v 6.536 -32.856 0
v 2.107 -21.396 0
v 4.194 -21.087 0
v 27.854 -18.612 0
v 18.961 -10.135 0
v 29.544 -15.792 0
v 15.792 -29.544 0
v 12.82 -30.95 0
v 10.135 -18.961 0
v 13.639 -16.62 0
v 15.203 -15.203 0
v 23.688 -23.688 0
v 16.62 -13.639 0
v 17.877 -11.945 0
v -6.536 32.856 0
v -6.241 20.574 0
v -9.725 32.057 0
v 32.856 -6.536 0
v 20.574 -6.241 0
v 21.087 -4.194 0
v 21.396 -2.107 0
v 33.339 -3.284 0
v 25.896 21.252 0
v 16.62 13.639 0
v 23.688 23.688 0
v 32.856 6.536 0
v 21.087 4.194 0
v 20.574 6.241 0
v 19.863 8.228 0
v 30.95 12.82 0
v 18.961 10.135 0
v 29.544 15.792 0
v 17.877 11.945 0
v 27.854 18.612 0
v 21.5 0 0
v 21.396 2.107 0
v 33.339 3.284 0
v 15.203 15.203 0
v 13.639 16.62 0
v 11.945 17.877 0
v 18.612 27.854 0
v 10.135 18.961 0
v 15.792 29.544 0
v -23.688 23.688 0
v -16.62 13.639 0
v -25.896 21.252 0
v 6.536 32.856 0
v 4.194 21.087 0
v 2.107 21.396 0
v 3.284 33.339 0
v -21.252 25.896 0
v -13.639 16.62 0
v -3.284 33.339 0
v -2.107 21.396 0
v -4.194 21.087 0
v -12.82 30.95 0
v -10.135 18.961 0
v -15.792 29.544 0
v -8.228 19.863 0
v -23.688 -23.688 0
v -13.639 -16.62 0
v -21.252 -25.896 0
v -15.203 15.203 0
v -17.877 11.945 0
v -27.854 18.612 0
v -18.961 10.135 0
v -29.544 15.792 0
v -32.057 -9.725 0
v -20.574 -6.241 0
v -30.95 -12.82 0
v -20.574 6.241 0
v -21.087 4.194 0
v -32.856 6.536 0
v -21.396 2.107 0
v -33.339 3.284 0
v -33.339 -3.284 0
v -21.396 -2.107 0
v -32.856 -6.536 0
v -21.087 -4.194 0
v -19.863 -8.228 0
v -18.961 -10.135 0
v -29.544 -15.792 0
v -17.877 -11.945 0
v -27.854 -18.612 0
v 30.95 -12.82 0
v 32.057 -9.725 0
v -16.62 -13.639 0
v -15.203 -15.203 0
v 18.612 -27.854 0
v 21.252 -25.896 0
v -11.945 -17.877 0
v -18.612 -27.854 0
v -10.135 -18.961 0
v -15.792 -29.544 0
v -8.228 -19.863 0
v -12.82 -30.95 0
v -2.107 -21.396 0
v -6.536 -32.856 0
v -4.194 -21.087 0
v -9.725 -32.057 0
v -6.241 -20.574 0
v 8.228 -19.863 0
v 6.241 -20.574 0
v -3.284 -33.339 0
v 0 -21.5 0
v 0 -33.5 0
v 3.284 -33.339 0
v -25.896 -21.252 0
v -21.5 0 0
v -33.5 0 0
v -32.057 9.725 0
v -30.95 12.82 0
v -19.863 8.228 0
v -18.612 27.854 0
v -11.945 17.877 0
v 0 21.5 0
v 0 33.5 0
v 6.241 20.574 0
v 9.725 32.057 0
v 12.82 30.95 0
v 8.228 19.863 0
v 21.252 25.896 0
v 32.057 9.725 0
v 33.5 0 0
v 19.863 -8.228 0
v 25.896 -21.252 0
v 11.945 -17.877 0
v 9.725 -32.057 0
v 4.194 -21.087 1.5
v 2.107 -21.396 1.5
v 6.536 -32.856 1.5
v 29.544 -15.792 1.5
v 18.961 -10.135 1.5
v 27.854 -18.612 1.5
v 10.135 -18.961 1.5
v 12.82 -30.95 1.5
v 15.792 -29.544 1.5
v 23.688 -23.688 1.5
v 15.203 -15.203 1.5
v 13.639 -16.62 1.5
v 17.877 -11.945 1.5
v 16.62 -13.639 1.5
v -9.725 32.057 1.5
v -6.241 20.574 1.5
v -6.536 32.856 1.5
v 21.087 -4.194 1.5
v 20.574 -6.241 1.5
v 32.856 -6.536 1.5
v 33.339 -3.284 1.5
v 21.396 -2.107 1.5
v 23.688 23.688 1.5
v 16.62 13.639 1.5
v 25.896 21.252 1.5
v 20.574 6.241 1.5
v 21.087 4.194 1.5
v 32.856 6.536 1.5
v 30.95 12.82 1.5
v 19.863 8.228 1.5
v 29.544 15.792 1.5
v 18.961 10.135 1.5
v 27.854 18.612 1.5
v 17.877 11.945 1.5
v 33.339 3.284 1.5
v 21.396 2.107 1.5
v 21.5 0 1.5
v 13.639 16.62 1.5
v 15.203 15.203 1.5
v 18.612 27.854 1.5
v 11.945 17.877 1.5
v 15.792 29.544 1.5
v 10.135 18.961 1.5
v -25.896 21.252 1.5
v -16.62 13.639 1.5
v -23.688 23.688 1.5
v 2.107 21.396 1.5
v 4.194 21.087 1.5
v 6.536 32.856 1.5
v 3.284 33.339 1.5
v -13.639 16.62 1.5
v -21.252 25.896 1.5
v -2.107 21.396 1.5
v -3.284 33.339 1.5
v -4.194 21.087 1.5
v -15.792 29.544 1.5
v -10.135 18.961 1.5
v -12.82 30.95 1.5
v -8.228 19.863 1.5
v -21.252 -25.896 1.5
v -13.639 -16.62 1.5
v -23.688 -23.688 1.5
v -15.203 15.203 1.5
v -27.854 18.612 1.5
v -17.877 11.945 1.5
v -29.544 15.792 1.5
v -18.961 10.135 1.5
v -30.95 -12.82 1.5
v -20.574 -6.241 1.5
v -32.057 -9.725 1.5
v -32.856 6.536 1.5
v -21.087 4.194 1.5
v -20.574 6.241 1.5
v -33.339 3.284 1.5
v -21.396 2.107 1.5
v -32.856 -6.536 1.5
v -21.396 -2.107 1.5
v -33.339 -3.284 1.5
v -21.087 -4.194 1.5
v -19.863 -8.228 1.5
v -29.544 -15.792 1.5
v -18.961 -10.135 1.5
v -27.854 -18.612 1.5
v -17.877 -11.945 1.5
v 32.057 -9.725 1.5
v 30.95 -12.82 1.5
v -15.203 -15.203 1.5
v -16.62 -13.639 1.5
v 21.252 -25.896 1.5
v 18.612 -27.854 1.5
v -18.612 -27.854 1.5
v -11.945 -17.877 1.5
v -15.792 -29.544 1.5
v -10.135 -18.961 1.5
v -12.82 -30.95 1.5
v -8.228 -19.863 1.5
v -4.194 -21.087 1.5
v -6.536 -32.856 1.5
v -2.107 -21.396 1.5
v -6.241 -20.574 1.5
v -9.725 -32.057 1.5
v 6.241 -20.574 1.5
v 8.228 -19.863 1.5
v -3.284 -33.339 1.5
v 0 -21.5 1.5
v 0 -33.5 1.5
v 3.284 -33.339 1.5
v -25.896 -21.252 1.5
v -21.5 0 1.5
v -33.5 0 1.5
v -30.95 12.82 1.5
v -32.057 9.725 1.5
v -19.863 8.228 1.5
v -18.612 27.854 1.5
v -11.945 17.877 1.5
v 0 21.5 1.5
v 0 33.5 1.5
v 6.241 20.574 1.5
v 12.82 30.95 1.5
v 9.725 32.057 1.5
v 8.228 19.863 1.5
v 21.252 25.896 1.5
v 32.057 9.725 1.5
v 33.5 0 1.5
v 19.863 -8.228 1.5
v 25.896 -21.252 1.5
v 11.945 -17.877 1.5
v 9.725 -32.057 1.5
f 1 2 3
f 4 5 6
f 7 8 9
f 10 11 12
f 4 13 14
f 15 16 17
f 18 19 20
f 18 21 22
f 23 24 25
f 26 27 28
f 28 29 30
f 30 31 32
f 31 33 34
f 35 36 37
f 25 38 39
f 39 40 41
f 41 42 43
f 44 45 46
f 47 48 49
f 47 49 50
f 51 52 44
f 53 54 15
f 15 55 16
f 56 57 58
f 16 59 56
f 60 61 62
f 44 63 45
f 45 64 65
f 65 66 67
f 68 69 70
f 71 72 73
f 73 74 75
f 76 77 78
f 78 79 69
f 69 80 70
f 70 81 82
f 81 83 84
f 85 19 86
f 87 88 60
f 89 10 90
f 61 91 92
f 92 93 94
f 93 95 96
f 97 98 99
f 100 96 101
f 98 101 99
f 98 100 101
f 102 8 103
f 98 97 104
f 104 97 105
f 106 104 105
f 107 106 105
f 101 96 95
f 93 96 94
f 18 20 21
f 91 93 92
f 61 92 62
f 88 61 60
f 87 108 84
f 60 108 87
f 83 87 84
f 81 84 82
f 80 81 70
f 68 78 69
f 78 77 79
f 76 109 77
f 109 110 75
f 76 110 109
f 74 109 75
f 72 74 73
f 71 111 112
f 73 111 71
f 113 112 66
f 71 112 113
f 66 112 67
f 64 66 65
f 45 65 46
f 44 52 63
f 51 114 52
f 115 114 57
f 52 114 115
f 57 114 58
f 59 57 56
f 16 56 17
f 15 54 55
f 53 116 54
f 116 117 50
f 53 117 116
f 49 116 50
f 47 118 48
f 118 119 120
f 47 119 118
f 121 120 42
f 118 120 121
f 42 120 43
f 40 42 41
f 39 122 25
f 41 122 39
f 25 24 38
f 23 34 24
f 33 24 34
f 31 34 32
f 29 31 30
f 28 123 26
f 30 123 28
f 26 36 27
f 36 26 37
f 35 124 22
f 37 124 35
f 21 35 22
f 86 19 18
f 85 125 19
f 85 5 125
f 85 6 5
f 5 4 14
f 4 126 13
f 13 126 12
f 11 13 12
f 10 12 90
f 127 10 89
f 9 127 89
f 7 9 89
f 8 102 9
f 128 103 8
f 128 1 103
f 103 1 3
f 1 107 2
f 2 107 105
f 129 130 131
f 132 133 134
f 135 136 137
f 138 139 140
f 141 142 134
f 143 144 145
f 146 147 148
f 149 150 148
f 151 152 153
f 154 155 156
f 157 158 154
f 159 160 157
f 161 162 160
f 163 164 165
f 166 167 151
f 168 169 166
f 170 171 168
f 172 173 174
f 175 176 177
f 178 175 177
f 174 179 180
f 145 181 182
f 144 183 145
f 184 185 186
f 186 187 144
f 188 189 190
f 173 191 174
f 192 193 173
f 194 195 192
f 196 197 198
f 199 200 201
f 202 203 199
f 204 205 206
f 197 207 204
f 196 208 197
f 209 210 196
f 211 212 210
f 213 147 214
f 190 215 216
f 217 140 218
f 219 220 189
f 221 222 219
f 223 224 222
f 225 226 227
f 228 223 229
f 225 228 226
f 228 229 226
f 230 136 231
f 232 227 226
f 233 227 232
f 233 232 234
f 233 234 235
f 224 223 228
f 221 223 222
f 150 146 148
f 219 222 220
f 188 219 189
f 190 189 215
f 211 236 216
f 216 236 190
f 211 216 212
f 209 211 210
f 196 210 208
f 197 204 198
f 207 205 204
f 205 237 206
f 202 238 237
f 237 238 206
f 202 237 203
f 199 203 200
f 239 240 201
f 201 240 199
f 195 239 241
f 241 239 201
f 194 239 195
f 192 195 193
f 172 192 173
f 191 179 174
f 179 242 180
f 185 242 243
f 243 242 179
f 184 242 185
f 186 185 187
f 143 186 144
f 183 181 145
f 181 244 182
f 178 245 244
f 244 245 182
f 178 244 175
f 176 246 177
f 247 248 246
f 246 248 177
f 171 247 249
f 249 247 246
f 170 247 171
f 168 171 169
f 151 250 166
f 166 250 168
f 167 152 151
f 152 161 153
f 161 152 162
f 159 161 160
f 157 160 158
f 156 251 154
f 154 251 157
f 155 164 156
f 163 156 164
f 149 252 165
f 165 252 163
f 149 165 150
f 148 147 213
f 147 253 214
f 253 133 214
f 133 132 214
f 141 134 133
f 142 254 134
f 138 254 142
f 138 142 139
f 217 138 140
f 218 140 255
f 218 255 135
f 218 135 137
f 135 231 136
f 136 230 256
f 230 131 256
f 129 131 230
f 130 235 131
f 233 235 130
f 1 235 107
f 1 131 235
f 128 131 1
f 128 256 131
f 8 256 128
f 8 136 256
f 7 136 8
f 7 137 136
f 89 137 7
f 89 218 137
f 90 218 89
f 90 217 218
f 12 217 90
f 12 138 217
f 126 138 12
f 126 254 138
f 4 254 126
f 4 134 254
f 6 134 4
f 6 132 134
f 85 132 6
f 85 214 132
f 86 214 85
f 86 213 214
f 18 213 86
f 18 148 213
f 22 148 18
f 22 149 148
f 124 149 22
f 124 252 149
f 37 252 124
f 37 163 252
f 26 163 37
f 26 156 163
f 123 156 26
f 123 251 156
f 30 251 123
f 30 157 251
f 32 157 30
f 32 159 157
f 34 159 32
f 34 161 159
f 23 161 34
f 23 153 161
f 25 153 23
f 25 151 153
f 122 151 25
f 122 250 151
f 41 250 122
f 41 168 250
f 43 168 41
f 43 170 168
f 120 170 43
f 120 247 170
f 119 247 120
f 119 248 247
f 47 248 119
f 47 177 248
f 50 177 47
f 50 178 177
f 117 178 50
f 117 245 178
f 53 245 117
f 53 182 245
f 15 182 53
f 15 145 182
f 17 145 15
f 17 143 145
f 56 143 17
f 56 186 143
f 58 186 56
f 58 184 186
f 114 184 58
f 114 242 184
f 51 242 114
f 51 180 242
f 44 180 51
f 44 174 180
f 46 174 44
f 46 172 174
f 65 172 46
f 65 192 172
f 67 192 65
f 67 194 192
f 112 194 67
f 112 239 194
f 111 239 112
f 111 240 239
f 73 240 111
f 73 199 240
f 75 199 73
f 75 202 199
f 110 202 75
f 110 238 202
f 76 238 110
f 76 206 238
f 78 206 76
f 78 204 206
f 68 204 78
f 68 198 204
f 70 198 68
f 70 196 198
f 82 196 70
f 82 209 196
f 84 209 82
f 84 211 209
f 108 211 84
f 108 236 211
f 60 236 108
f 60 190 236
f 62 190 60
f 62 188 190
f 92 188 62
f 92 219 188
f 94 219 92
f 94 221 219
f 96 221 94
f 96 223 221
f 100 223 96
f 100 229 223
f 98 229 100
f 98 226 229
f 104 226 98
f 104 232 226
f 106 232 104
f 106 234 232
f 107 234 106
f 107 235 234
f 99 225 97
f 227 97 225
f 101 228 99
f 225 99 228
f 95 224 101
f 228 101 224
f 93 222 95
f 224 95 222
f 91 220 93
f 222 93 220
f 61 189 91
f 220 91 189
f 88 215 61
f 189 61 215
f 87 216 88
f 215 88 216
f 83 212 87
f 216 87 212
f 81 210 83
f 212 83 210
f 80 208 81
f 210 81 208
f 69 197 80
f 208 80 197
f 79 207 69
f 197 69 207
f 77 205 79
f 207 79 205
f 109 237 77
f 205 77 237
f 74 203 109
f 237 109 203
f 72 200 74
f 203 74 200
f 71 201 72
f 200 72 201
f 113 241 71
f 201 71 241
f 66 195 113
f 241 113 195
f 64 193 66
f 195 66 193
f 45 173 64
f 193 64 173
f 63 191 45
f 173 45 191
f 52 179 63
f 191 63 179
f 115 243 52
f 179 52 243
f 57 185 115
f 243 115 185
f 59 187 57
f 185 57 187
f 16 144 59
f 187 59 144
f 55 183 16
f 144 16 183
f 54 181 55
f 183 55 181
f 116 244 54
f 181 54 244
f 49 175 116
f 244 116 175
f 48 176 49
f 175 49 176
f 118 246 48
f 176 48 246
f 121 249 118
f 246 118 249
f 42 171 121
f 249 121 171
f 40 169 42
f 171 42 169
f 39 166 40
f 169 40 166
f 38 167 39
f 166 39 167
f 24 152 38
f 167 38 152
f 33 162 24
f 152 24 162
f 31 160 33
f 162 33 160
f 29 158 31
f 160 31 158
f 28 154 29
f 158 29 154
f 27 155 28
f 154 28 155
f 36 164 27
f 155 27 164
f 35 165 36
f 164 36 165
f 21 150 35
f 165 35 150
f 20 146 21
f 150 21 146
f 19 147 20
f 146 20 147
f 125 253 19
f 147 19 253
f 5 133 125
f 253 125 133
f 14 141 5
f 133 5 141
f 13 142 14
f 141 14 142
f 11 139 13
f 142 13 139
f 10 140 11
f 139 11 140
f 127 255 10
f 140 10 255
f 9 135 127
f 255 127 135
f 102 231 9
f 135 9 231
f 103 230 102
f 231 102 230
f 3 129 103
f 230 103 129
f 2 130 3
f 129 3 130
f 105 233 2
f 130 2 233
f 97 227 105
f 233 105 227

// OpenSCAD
soda_outer_d=63;
soda_inner_d=47;

plus=4;

height=1.5;

$fn=64;

linear_extrude(height = height) 
difference() {
  circle(d=soda_outer_d+plus);
  circle(d=soda_inner_d-plus);
}
